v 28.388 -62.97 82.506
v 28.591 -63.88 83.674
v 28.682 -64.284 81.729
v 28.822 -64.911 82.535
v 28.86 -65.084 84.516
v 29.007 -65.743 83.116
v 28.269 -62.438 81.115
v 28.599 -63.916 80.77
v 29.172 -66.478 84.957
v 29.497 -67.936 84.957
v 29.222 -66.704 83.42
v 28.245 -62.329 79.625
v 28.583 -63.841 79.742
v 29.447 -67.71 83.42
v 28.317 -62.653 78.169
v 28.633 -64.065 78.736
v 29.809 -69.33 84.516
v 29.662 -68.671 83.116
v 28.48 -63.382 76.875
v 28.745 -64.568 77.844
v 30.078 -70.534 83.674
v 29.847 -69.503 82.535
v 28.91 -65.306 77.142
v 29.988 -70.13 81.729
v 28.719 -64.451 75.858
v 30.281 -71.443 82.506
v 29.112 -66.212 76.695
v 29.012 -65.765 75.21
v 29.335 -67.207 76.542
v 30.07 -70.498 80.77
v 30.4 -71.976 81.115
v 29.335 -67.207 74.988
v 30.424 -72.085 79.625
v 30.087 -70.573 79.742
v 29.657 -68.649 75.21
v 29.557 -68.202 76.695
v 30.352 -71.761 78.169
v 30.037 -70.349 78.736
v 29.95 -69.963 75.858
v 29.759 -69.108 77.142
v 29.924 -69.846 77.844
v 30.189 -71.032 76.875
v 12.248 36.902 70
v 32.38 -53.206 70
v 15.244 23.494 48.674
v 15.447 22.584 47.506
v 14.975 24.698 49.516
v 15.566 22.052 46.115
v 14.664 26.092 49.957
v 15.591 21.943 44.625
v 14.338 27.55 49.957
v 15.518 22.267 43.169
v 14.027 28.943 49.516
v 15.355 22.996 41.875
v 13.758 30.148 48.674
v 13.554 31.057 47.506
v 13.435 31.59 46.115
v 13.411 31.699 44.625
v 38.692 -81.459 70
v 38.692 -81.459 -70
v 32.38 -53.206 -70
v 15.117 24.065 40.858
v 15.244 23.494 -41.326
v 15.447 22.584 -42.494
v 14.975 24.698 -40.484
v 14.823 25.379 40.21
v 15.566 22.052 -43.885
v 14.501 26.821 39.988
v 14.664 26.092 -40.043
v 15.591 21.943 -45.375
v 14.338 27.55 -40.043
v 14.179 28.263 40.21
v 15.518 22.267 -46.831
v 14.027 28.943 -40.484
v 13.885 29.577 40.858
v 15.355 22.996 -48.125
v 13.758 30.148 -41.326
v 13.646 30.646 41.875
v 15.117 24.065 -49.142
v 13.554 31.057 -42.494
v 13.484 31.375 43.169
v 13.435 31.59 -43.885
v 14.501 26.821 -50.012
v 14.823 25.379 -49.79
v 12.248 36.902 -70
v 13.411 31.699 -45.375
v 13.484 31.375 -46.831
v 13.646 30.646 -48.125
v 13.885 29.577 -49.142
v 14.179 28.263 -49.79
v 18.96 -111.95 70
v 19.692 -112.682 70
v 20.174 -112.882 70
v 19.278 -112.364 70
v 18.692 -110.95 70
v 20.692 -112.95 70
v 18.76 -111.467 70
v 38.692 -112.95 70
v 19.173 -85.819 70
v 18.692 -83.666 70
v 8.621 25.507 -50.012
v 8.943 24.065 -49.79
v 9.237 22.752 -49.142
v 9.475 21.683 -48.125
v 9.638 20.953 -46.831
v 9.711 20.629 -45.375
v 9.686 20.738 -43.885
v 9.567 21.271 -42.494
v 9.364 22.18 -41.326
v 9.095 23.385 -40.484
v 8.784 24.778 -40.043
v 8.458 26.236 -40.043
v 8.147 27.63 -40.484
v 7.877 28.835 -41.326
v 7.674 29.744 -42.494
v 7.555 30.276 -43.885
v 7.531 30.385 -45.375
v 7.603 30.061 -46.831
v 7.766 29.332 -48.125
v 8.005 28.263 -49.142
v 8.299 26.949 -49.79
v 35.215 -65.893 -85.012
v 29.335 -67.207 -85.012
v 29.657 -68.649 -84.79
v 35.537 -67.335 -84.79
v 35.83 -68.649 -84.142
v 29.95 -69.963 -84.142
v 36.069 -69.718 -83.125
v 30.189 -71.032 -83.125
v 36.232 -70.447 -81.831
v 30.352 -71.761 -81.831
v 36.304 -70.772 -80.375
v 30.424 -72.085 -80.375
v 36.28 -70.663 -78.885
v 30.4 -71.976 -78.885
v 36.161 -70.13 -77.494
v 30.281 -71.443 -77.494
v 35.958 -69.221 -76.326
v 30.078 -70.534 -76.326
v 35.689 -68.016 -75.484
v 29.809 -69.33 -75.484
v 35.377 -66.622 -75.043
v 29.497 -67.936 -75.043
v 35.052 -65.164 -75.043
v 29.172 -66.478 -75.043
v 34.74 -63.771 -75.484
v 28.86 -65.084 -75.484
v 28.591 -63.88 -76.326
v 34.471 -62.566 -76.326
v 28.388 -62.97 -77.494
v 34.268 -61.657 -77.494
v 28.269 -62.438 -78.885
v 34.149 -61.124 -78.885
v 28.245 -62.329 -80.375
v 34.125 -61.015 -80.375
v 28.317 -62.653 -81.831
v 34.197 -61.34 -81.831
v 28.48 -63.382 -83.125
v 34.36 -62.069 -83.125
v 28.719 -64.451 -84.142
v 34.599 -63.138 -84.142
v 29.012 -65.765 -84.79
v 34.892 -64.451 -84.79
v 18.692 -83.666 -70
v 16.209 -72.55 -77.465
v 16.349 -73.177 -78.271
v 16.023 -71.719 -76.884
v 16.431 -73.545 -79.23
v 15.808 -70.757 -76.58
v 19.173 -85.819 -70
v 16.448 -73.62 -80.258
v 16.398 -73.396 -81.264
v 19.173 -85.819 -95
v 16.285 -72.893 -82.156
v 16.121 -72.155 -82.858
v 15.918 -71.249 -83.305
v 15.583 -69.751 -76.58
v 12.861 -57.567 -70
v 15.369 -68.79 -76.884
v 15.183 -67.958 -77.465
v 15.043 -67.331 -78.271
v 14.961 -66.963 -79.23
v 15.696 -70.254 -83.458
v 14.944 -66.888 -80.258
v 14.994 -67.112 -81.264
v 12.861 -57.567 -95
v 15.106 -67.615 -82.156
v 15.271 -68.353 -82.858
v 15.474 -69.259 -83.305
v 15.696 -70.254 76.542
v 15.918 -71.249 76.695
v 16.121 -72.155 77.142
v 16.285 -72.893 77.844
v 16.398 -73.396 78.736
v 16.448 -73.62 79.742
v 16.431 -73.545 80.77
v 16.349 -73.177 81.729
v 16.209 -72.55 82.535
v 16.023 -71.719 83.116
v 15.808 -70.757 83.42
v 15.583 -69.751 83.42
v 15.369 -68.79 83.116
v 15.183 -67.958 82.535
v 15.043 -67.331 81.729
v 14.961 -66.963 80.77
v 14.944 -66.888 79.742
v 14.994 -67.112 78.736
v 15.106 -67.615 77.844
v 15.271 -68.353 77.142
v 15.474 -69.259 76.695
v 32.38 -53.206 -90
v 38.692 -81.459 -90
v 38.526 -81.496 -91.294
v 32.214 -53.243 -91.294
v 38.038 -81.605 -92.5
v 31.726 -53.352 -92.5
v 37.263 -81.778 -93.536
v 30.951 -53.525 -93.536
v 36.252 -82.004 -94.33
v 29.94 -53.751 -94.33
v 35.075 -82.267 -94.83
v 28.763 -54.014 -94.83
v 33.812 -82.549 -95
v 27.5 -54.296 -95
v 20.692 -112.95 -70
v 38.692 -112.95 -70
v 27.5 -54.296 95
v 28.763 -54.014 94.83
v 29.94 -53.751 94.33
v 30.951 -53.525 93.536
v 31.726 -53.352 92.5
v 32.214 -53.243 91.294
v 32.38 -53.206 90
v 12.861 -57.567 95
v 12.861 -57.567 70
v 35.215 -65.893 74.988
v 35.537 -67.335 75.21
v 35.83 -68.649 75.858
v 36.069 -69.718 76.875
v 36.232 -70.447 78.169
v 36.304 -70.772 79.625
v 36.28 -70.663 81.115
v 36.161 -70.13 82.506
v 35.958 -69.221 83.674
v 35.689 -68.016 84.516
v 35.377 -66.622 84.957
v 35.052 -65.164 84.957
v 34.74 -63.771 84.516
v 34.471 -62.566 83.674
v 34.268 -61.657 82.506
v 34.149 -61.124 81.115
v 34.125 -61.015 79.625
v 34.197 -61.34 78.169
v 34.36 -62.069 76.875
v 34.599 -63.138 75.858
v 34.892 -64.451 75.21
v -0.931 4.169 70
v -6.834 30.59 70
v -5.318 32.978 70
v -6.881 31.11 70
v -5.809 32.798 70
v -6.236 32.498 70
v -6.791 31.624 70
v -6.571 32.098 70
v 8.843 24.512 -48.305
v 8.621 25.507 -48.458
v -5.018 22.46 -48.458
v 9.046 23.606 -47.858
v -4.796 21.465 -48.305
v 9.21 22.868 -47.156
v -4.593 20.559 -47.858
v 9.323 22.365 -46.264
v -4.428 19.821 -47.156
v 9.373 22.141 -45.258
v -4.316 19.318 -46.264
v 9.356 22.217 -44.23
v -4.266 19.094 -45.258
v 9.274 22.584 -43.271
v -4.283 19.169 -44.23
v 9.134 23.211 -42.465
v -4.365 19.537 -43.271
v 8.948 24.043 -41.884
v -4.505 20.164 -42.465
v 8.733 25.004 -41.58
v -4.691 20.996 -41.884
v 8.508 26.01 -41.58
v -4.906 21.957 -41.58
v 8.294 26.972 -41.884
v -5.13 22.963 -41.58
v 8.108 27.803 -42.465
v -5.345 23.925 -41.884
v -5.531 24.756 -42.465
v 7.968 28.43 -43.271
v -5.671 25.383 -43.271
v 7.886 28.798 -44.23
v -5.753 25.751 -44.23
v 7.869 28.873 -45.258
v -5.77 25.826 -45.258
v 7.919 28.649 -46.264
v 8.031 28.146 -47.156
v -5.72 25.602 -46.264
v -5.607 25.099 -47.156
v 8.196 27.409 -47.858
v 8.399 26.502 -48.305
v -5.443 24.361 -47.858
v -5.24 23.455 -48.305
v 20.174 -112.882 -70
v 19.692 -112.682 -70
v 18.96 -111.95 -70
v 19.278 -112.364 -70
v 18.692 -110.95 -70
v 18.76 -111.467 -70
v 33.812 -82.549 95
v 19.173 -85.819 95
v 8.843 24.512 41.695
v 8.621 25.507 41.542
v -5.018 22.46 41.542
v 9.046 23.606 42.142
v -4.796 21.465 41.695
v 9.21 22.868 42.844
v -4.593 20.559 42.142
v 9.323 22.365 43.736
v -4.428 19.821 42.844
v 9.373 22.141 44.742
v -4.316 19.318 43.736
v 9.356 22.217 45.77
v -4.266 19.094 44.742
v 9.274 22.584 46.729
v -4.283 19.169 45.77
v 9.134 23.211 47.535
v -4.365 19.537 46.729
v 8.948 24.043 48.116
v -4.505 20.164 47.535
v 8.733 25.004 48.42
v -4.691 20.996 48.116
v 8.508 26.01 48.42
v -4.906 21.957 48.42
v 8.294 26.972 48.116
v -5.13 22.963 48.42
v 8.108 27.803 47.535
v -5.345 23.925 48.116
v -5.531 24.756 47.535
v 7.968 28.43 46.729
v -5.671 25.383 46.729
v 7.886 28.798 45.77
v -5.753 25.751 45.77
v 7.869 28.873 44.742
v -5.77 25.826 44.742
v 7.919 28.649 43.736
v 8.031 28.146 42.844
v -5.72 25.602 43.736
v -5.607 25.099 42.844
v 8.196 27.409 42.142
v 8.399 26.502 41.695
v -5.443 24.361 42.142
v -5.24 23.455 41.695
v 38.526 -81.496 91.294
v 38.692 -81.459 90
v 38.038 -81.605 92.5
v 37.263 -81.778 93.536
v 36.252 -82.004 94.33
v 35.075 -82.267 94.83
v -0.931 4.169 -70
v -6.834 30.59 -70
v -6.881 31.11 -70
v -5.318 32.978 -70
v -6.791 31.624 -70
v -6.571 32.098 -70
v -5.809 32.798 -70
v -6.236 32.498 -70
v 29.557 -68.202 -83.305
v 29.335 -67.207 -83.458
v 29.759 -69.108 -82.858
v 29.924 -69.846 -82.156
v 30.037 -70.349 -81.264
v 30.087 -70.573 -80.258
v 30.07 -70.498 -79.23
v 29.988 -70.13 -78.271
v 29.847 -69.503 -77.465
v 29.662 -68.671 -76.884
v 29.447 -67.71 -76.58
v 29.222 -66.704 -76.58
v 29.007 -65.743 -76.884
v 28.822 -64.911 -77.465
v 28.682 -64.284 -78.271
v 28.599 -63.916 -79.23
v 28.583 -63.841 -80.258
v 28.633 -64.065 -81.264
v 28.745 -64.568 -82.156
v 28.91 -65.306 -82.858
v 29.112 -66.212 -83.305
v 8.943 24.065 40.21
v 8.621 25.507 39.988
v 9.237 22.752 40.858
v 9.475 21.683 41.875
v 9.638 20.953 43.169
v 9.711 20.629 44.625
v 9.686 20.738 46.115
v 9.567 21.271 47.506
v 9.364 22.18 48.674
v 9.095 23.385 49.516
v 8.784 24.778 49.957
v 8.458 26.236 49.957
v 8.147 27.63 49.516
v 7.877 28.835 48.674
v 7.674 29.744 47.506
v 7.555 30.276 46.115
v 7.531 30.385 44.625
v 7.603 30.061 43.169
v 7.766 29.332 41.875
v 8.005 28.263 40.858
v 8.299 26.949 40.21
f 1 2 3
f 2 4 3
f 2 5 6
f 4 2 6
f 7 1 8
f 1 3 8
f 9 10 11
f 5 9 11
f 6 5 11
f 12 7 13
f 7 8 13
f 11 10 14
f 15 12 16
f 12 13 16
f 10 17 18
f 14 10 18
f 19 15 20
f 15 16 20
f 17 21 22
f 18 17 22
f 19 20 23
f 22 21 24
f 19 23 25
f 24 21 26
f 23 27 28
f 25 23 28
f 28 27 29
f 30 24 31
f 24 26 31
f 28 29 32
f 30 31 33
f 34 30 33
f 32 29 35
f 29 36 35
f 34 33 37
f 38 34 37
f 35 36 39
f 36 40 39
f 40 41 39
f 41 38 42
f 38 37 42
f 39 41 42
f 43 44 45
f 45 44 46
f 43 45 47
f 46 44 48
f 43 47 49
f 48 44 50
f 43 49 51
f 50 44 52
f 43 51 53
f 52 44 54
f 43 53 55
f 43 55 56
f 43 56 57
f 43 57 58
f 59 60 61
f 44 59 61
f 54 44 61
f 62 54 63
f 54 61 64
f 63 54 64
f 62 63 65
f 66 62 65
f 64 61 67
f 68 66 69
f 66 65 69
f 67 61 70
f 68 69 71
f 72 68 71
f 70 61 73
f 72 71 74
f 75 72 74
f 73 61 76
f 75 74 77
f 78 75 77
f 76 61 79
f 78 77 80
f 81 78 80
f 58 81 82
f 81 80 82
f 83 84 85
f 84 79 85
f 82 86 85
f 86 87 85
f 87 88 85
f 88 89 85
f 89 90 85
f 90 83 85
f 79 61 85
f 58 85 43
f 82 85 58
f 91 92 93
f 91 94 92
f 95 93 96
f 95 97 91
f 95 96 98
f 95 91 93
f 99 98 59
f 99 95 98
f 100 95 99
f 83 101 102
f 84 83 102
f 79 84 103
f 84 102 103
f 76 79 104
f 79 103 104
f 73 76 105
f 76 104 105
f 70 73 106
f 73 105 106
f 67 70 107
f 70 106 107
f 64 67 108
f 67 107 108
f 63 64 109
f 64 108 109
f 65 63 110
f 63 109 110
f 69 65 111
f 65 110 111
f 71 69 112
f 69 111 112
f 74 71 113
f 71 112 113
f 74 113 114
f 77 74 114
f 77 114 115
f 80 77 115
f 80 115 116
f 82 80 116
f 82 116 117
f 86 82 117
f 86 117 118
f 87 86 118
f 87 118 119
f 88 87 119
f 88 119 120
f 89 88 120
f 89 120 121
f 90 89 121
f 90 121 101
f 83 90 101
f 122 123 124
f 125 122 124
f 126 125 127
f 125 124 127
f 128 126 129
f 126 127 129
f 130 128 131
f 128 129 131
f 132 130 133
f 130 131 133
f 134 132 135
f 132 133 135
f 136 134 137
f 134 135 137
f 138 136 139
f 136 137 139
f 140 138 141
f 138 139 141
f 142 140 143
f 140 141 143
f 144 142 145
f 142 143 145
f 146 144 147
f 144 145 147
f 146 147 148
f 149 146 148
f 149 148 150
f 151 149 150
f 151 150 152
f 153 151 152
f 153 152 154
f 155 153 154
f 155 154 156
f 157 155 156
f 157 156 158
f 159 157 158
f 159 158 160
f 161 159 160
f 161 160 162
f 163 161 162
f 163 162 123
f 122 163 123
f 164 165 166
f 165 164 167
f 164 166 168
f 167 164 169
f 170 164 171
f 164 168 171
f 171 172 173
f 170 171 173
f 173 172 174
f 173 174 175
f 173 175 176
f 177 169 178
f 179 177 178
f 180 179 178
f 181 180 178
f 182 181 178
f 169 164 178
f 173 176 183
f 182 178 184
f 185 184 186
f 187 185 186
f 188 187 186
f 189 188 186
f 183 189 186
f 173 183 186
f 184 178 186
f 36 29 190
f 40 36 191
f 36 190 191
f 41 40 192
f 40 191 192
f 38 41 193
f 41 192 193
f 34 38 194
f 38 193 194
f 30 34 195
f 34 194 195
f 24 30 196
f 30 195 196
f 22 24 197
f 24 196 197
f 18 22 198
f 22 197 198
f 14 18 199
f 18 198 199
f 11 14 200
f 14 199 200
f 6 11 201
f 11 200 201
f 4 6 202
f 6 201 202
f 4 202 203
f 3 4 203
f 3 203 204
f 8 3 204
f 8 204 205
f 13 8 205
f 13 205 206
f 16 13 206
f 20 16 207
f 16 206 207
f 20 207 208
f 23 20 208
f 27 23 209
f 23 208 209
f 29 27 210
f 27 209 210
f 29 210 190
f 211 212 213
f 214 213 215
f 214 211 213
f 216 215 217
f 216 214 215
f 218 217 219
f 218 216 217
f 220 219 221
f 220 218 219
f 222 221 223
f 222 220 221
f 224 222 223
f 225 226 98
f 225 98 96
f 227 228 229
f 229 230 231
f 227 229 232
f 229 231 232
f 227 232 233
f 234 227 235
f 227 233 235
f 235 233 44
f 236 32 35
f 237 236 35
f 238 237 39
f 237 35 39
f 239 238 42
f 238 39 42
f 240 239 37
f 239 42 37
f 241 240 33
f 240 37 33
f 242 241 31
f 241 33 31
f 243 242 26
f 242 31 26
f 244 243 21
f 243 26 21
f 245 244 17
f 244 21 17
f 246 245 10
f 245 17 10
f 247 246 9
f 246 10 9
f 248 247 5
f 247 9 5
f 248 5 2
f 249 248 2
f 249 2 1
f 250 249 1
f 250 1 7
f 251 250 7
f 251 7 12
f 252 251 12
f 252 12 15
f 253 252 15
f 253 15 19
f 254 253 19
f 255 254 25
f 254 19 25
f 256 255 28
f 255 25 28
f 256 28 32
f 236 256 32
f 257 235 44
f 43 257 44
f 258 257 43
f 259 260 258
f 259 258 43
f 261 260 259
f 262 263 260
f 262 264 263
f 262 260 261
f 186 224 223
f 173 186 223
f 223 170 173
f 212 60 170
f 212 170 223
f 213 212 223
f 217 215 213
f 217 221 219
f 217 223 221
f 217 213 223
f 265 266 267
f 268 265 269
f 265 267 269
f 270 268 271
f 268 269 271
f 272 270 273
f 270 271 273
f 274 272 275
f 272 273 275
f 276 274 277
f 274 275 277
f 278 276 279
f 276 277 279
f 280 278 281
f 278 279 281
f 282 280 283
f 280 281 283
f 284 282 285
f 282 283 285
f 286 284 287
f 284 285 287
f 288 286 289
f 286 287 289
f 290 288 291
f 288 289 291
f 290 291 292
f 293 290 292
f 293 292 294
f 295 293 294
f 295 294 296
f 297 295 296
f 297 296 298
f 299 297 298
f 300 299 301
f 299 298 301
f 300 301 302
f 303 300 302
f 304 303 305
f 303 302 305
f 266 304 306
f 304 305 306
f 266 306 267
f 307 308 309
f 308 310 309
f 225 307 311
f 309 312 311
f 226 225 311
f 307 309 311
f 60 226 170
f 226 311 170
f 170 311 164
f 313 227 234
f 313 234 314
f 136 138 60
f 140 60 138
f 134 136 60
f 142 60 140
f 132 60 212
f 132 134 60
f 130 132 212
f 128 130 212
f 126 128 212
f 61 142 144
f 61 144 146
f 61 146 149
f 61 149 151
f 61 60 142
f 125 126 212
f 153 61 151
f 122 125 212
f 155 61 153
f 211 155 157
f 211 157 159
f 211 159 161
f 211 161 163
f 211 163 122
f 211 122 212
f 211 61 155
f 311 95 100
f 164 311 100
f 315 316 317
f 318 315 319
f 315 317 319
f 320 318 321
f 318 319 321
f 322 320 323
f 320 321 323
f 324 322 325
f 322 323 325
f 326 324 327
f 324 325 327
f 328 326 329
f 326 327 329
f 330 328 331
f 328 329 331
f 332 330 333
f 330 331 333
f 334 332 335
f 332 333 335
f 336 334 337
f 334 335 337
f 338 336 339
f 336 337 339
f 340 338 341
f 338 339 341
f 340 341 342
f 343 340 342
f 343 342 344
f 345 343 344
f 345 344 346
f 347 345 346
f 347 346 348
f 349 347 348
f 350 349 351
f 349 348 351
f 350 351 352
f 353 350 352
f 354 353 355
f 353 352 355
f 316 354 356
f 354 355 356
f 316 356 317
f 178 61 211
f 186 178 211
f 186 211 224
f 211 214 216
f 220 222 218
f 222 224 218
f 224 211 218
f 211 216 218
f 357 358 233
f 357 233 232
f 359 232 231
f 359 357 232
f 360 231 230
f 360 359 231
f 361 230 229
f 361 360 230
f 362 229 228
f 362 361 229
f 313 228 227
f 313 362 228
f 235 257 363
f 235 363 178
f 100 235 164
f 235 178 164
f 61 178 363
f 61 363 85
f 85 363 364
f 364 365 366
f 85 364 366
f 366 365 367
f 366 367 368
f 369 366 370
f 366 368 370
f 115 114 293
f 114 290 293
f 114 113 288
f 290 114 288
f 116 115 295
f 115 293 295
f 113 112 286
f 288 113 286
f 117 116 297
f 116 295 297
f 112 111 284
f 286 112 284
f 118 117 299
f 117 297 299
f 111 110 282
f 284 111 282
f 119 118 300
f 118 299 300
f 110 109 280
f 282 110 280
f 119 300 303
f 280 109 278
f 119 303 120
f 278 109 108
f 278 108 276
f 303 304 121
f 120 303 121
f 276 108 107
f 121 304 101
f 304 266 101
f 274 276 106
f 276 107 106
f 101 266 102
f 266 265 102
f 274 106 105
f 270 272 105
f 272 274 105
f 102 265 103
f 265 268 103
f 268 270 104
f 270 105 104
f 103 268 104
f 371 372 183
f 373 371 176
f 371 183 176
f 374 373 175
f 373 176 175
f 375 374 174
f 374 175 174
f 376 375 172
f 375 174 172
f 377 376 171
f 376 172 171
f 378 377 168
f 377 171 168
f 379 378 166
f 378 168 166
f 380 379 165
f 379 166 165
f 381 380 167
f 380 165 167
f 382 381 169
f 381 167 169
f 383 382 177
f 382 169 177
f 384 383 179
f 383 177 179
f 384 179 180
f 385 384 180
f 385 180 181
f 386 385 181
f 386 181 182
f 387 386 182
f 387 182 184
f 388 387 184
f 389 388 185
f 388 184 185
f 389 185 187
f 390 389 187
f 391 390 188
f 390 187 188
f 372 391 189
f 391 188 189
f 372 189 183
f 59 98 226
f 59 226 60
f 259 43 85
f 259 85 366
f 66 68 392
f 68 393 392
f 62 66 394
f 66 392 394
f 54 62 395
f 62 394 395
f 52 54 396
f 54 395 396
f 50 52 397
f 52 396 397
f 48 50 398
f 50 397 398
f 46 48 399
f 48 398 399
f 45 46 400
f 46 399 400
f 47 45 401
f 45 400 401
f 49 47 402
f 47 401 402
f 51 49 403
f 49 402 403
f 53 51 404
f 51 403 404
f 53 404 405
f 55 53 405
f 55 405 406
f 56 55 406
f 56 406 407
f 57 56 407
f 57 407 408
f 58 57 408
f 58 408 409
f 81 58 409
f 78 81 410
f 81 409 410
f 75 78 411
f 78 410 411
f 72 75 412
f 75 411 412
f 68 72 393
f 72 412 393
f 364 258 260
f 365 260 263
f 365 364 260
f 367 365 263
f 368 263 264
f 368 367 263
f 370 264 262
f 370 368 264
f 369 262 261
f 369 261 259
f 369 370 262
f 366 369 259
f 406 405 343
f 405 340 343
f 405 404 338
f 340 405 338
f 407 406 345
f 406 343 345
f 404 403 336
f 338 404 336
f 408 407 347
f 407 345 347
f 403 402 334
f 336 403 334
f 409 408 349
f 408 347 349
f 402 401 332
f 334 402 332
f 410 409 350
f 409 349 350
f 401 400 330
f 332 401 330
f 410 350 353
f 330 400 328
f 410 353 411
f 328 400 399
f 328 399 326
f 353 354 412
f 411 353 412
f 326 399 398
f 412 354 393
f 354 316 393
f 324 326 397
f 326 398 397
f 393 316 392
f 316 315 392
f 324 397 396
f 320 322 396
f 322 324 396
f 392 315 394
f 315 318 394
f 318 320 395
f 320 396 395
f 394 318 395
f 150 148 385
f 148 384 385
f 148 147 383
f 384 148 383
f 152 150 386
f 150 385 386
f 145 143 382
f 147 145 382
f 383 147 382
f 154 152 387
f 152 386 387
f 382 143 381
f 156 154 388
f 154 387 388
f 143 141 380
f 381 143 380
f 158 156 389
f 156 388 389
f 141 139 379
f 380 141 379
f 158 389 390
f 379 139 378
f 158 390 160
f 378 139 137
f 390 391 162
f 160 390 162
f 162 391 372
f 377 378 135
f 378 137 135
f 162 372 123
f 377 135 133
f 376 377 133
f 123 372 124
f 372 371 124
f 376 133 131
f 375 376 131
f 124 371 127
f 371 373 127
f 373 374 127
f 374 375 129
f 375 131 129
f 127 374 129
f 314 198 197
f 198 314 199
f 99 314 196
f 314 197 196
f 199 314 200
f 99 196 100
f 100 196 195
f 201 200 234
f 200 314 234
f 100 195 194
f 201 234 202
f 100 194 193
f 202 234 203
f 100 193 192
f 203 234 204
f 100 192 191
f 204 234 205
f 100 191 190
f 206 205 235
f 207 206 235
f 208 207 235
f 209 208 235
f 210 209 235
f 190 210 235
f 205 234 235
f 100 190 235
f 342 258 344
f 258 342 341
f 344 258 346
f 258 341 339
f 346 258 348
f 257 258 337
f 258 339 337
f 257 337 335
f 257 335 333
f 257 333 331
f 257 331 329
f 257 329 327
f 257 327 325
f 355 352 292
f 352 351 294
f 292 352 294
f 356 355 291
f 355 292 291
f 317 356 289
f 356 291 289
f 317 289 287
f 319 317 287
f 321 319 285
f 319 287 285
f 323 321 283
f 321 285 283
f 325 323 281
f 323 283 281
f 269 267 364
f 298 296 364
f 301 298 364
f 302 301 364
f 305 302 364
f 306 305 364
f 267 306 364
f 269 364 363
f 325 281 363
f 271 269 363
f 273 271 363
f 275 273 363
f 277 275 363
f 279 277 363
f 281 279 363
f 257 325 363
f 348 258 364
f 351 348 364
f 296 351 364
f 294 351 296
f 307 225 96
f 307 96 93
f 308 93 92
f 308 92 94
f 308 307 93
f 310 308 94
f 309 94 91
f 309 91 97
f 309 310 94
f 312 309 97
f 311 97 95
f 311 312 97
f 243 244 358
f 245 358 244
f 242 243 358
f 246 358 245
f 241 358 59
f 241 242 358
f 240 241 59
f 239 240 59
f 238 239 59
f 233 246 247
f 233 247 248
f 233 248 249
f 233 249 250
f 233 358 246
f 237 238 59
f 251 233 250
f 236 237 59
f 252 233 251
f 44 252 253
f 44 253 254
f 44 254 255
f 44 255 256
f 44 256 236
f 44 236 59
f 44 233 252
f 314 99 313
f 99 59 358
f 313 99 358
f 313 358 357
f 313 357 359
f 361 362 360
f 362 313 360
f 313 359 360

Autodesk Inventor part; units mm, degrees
ref_plane "YZ Plane" through (0, 0, 0) normal (1, 0, 0) x (0, 1, 0)
ref_plane "XZ Plane" through (0, 0, 0) normal (0, 1, 0) x (-1, 0, 0)
ref_plane "XY Plane" through (0, 0, 0) normal (0, 0, 1) x (1, 0, 0)
sketch "Sketch9" plane through (0, 0, 0) normal (0, 0, 1) x (1, 0, 0)
  line L0 (38.6921, -112.9498) -> (20.6921, -112.9498)
  arc A0 (18.6921, -110.9498) -> (20.6921, -112.9498) centre (20.6921, -110.9498) ccw
  line L1 (18.6921, -110.9498) -> (18.6921, -83.6655)
  line L2 (-0.9314, 4.1691) -> (18.6921, -83.6655)
  line L3 (-6.8342, 30.5897) -> (0, 0)
  arc A1 (-5.3184, 32.9777) -> (-6.8342, 30.5897) centre (-4.8823, 31.0258) ccw
  line L4 (12.2485, 36.9024) -> (-5.3184, 32.9777)
  line L5 (38.6921, -112.9498) -> (38.6921, -81.4586)
  line L6 (38.6921, -81.4586) -> (12.2485, 36.9024)
  point P0 (0, 0)
extrude "Extrusion8" add sketch "Sketch9" along normal mid plane 190
sketch "Sketch10" plane through (38.6921, -112.9498, 95) normal (1, 0, 0) x (0, 0, -1)
  point P0 (95, 112.9498)
sketch "Sketch11" plane through (0, 0, 0) normal (1, 0, 0) x (0, 1, 0)
  line L0 (-112.9498, 70) -> (-81.4586, 70)
  line L1 (-112.9498, -70) -> (-81.4586, -70)
  line L2 (-81.4586, -95) -> (-81.4586, 95) projected
  line L3 (-112.9498, 95) -> (-81.4586, 95) projected
  line L4 (-112.9498, -95) -> (-112.9498, 95) projected
  line L5 (-81.4586, -95) -> (-112.9498, -95) projected
  point P0 (0, 0)
  dimension "d39" = 140
  dimension "d40" = 70
extrude "Extrusion9" cut sketch "Sketch11" along normal through all both and the other way through all contours L4 L3 L2 L0 | L1 L2 L5 L4
sketch "Sketch12" plane through (12.2485, 36.9024, 95) normal (0.97594, 0.2180394, 0) x (0, 0, -1)
  line L0 (25, -121.279) -> (25, 0)
  line L1 (165, -121.279) -> (165, 0)
  line L2 (190, 0) -> (190, -121.279) projected
  line L3 (0, -121.279) -> (0, 0) projected
  line L4 (190, 0) -> (0, 0) projected
  line L5 (0, -121.279) -> (0, 0) projected
  line L6 (25, -121.279) -> (0, -121.279) projected
  line L7 (165, -121.279) -> (25, -121.279) projected
  line L8 (190, -121.279) -> (165, -121.279) projected
  line L9 (190, 0) -> (190, -121.279) projected
  point P0 (95, -33.3439)
  dimension "d44" = 25
  dimension "d45" = 25
  dimension "d46" = 140
extrude "Extrusion10" cut sketch "Sketch12" along normal through all both and the other way through all contours L6 L3 L4 L0 | L1 L4 L2 L8
sketch "Sketch13" plane through (12.2485, 36.9024, 70) normal (0.97594, 0.2180394, 0) x (0, 0, -1)
  line L0 (140, -152.0125) -> (0, -152.0125) projected
  line L1 (70, -152.0125) -> (70, -0.0751)
  circle A0 centre (115, -10.33) radius 3.4585
  circle A1 centre (25, -10.33) radius 3.4585
  circle A2 centre (-10, -105.33) radius 3.4585
  circle A3 centre (150, -105.33) radius 3.4585
  line L2 (0, 0) -> (140, 0)
  line L3 (0, 0) -> (0, -31.3439)
  line L4 (0, -31.3439) -> (12.5, -31.3439)
  line L5 (12.5, -31.3439) -> (12.5, -72.33)
  line L6 (12.5, -72.33) -> (0, -72.33)
  line L7 (0, -72.33) -> (0, -92.33)
  line L8 (-25, -92.33) -> (0, -92.33)
  ellipse E0 centre (2, -126.2447) end of major axis (2, -117.072) minor radius 2 (2, -117.072) -> (0.6988, -119.279) ccw
  line L9 (2, -117.072) -> (27.5, -117.072)
  line L10 (27.5, -27.072) -> (27.5, -117.072)
  line L11 (112.5, -27.072) -> (27.5, -27.072)
  line L12 (112.5, -117.072) -> (112.5, -27.072)
  line L13 (112.5, -117.072) -> (138, -117.072)
  ellipse E1 centre (138, -126.2447) end of major axis (138, -135.4173) minor radius 2 (139.3012, -119.279) -> (138, -117.072) ccw
  line L14 (165, -92.33) -> (165, -114.8107)
  line L15 (140, -92.33) -> (165, -92.33)
  line L16 (140, -92.33) -> (140, -72.33)
  line L17 (140, -72.33) -> (127.5, -72.33)
  line L18 (127.5, -72.33) -> (127.5, -31.3439)
  line L19 (127.5, -31.3439) -> (140, -31.3439)
  line L20 (140, -31.3439) -> (140, 0)
  line L21 (0, 0) -> (0, -121.279) projected
  line L22 (140, -121.279) -> (140, 0) projected
  line L23 (0, -121.279) -> (0, -152.0125) projected
  line L24 (0, -121.279) -> (-25, -121.279)
  line L25 (-25, -92.33) -> (-25, -121.279)
  line L26 (-25, -92.33) -> (7.4202, -92.33) construction
  line L27 (140, -121.279) -> (165, -121.279)
  line L28 (165, -92.33) -> (165, -121.279)
  point P0 (70, -33.3439)
  point P1 (-25.1048, -117.072)
  point P2 (-25, -119.279)
  point P3 (165, -119.279)
  dimension "d58" = 90
extrude "Extrusion11" add sketch "Sketch13" against normal up to surface (20 mm away) contours A2 | A3 | L8 L21 L24 L25 | L14 L28 L27 L22 L15
hole "Hole1" at (35.2146, -65.8933, -80) at (14.5009, 26.8209, -45) at (14.5009, 26.8209, 45) at (35.2146, -65.8933, 80) direction (-0.97594, -0.2180394, 0) diameter 6.917 depth 27.125 tip angle 118 counterbore diameter 10.025 counterbore depth 6.025 thread size "M8x1" class "6H" standard "ISO Metric profile"
fillet "Fillet3" radius 5 2 edges at (35.5361, -67.3324, 95) (35.5361, -67.3324, -95)
equation "\"d40\" = 0.5 * d39"
properties part number "Cover of robot upper base" material "Steel, Alloy"
